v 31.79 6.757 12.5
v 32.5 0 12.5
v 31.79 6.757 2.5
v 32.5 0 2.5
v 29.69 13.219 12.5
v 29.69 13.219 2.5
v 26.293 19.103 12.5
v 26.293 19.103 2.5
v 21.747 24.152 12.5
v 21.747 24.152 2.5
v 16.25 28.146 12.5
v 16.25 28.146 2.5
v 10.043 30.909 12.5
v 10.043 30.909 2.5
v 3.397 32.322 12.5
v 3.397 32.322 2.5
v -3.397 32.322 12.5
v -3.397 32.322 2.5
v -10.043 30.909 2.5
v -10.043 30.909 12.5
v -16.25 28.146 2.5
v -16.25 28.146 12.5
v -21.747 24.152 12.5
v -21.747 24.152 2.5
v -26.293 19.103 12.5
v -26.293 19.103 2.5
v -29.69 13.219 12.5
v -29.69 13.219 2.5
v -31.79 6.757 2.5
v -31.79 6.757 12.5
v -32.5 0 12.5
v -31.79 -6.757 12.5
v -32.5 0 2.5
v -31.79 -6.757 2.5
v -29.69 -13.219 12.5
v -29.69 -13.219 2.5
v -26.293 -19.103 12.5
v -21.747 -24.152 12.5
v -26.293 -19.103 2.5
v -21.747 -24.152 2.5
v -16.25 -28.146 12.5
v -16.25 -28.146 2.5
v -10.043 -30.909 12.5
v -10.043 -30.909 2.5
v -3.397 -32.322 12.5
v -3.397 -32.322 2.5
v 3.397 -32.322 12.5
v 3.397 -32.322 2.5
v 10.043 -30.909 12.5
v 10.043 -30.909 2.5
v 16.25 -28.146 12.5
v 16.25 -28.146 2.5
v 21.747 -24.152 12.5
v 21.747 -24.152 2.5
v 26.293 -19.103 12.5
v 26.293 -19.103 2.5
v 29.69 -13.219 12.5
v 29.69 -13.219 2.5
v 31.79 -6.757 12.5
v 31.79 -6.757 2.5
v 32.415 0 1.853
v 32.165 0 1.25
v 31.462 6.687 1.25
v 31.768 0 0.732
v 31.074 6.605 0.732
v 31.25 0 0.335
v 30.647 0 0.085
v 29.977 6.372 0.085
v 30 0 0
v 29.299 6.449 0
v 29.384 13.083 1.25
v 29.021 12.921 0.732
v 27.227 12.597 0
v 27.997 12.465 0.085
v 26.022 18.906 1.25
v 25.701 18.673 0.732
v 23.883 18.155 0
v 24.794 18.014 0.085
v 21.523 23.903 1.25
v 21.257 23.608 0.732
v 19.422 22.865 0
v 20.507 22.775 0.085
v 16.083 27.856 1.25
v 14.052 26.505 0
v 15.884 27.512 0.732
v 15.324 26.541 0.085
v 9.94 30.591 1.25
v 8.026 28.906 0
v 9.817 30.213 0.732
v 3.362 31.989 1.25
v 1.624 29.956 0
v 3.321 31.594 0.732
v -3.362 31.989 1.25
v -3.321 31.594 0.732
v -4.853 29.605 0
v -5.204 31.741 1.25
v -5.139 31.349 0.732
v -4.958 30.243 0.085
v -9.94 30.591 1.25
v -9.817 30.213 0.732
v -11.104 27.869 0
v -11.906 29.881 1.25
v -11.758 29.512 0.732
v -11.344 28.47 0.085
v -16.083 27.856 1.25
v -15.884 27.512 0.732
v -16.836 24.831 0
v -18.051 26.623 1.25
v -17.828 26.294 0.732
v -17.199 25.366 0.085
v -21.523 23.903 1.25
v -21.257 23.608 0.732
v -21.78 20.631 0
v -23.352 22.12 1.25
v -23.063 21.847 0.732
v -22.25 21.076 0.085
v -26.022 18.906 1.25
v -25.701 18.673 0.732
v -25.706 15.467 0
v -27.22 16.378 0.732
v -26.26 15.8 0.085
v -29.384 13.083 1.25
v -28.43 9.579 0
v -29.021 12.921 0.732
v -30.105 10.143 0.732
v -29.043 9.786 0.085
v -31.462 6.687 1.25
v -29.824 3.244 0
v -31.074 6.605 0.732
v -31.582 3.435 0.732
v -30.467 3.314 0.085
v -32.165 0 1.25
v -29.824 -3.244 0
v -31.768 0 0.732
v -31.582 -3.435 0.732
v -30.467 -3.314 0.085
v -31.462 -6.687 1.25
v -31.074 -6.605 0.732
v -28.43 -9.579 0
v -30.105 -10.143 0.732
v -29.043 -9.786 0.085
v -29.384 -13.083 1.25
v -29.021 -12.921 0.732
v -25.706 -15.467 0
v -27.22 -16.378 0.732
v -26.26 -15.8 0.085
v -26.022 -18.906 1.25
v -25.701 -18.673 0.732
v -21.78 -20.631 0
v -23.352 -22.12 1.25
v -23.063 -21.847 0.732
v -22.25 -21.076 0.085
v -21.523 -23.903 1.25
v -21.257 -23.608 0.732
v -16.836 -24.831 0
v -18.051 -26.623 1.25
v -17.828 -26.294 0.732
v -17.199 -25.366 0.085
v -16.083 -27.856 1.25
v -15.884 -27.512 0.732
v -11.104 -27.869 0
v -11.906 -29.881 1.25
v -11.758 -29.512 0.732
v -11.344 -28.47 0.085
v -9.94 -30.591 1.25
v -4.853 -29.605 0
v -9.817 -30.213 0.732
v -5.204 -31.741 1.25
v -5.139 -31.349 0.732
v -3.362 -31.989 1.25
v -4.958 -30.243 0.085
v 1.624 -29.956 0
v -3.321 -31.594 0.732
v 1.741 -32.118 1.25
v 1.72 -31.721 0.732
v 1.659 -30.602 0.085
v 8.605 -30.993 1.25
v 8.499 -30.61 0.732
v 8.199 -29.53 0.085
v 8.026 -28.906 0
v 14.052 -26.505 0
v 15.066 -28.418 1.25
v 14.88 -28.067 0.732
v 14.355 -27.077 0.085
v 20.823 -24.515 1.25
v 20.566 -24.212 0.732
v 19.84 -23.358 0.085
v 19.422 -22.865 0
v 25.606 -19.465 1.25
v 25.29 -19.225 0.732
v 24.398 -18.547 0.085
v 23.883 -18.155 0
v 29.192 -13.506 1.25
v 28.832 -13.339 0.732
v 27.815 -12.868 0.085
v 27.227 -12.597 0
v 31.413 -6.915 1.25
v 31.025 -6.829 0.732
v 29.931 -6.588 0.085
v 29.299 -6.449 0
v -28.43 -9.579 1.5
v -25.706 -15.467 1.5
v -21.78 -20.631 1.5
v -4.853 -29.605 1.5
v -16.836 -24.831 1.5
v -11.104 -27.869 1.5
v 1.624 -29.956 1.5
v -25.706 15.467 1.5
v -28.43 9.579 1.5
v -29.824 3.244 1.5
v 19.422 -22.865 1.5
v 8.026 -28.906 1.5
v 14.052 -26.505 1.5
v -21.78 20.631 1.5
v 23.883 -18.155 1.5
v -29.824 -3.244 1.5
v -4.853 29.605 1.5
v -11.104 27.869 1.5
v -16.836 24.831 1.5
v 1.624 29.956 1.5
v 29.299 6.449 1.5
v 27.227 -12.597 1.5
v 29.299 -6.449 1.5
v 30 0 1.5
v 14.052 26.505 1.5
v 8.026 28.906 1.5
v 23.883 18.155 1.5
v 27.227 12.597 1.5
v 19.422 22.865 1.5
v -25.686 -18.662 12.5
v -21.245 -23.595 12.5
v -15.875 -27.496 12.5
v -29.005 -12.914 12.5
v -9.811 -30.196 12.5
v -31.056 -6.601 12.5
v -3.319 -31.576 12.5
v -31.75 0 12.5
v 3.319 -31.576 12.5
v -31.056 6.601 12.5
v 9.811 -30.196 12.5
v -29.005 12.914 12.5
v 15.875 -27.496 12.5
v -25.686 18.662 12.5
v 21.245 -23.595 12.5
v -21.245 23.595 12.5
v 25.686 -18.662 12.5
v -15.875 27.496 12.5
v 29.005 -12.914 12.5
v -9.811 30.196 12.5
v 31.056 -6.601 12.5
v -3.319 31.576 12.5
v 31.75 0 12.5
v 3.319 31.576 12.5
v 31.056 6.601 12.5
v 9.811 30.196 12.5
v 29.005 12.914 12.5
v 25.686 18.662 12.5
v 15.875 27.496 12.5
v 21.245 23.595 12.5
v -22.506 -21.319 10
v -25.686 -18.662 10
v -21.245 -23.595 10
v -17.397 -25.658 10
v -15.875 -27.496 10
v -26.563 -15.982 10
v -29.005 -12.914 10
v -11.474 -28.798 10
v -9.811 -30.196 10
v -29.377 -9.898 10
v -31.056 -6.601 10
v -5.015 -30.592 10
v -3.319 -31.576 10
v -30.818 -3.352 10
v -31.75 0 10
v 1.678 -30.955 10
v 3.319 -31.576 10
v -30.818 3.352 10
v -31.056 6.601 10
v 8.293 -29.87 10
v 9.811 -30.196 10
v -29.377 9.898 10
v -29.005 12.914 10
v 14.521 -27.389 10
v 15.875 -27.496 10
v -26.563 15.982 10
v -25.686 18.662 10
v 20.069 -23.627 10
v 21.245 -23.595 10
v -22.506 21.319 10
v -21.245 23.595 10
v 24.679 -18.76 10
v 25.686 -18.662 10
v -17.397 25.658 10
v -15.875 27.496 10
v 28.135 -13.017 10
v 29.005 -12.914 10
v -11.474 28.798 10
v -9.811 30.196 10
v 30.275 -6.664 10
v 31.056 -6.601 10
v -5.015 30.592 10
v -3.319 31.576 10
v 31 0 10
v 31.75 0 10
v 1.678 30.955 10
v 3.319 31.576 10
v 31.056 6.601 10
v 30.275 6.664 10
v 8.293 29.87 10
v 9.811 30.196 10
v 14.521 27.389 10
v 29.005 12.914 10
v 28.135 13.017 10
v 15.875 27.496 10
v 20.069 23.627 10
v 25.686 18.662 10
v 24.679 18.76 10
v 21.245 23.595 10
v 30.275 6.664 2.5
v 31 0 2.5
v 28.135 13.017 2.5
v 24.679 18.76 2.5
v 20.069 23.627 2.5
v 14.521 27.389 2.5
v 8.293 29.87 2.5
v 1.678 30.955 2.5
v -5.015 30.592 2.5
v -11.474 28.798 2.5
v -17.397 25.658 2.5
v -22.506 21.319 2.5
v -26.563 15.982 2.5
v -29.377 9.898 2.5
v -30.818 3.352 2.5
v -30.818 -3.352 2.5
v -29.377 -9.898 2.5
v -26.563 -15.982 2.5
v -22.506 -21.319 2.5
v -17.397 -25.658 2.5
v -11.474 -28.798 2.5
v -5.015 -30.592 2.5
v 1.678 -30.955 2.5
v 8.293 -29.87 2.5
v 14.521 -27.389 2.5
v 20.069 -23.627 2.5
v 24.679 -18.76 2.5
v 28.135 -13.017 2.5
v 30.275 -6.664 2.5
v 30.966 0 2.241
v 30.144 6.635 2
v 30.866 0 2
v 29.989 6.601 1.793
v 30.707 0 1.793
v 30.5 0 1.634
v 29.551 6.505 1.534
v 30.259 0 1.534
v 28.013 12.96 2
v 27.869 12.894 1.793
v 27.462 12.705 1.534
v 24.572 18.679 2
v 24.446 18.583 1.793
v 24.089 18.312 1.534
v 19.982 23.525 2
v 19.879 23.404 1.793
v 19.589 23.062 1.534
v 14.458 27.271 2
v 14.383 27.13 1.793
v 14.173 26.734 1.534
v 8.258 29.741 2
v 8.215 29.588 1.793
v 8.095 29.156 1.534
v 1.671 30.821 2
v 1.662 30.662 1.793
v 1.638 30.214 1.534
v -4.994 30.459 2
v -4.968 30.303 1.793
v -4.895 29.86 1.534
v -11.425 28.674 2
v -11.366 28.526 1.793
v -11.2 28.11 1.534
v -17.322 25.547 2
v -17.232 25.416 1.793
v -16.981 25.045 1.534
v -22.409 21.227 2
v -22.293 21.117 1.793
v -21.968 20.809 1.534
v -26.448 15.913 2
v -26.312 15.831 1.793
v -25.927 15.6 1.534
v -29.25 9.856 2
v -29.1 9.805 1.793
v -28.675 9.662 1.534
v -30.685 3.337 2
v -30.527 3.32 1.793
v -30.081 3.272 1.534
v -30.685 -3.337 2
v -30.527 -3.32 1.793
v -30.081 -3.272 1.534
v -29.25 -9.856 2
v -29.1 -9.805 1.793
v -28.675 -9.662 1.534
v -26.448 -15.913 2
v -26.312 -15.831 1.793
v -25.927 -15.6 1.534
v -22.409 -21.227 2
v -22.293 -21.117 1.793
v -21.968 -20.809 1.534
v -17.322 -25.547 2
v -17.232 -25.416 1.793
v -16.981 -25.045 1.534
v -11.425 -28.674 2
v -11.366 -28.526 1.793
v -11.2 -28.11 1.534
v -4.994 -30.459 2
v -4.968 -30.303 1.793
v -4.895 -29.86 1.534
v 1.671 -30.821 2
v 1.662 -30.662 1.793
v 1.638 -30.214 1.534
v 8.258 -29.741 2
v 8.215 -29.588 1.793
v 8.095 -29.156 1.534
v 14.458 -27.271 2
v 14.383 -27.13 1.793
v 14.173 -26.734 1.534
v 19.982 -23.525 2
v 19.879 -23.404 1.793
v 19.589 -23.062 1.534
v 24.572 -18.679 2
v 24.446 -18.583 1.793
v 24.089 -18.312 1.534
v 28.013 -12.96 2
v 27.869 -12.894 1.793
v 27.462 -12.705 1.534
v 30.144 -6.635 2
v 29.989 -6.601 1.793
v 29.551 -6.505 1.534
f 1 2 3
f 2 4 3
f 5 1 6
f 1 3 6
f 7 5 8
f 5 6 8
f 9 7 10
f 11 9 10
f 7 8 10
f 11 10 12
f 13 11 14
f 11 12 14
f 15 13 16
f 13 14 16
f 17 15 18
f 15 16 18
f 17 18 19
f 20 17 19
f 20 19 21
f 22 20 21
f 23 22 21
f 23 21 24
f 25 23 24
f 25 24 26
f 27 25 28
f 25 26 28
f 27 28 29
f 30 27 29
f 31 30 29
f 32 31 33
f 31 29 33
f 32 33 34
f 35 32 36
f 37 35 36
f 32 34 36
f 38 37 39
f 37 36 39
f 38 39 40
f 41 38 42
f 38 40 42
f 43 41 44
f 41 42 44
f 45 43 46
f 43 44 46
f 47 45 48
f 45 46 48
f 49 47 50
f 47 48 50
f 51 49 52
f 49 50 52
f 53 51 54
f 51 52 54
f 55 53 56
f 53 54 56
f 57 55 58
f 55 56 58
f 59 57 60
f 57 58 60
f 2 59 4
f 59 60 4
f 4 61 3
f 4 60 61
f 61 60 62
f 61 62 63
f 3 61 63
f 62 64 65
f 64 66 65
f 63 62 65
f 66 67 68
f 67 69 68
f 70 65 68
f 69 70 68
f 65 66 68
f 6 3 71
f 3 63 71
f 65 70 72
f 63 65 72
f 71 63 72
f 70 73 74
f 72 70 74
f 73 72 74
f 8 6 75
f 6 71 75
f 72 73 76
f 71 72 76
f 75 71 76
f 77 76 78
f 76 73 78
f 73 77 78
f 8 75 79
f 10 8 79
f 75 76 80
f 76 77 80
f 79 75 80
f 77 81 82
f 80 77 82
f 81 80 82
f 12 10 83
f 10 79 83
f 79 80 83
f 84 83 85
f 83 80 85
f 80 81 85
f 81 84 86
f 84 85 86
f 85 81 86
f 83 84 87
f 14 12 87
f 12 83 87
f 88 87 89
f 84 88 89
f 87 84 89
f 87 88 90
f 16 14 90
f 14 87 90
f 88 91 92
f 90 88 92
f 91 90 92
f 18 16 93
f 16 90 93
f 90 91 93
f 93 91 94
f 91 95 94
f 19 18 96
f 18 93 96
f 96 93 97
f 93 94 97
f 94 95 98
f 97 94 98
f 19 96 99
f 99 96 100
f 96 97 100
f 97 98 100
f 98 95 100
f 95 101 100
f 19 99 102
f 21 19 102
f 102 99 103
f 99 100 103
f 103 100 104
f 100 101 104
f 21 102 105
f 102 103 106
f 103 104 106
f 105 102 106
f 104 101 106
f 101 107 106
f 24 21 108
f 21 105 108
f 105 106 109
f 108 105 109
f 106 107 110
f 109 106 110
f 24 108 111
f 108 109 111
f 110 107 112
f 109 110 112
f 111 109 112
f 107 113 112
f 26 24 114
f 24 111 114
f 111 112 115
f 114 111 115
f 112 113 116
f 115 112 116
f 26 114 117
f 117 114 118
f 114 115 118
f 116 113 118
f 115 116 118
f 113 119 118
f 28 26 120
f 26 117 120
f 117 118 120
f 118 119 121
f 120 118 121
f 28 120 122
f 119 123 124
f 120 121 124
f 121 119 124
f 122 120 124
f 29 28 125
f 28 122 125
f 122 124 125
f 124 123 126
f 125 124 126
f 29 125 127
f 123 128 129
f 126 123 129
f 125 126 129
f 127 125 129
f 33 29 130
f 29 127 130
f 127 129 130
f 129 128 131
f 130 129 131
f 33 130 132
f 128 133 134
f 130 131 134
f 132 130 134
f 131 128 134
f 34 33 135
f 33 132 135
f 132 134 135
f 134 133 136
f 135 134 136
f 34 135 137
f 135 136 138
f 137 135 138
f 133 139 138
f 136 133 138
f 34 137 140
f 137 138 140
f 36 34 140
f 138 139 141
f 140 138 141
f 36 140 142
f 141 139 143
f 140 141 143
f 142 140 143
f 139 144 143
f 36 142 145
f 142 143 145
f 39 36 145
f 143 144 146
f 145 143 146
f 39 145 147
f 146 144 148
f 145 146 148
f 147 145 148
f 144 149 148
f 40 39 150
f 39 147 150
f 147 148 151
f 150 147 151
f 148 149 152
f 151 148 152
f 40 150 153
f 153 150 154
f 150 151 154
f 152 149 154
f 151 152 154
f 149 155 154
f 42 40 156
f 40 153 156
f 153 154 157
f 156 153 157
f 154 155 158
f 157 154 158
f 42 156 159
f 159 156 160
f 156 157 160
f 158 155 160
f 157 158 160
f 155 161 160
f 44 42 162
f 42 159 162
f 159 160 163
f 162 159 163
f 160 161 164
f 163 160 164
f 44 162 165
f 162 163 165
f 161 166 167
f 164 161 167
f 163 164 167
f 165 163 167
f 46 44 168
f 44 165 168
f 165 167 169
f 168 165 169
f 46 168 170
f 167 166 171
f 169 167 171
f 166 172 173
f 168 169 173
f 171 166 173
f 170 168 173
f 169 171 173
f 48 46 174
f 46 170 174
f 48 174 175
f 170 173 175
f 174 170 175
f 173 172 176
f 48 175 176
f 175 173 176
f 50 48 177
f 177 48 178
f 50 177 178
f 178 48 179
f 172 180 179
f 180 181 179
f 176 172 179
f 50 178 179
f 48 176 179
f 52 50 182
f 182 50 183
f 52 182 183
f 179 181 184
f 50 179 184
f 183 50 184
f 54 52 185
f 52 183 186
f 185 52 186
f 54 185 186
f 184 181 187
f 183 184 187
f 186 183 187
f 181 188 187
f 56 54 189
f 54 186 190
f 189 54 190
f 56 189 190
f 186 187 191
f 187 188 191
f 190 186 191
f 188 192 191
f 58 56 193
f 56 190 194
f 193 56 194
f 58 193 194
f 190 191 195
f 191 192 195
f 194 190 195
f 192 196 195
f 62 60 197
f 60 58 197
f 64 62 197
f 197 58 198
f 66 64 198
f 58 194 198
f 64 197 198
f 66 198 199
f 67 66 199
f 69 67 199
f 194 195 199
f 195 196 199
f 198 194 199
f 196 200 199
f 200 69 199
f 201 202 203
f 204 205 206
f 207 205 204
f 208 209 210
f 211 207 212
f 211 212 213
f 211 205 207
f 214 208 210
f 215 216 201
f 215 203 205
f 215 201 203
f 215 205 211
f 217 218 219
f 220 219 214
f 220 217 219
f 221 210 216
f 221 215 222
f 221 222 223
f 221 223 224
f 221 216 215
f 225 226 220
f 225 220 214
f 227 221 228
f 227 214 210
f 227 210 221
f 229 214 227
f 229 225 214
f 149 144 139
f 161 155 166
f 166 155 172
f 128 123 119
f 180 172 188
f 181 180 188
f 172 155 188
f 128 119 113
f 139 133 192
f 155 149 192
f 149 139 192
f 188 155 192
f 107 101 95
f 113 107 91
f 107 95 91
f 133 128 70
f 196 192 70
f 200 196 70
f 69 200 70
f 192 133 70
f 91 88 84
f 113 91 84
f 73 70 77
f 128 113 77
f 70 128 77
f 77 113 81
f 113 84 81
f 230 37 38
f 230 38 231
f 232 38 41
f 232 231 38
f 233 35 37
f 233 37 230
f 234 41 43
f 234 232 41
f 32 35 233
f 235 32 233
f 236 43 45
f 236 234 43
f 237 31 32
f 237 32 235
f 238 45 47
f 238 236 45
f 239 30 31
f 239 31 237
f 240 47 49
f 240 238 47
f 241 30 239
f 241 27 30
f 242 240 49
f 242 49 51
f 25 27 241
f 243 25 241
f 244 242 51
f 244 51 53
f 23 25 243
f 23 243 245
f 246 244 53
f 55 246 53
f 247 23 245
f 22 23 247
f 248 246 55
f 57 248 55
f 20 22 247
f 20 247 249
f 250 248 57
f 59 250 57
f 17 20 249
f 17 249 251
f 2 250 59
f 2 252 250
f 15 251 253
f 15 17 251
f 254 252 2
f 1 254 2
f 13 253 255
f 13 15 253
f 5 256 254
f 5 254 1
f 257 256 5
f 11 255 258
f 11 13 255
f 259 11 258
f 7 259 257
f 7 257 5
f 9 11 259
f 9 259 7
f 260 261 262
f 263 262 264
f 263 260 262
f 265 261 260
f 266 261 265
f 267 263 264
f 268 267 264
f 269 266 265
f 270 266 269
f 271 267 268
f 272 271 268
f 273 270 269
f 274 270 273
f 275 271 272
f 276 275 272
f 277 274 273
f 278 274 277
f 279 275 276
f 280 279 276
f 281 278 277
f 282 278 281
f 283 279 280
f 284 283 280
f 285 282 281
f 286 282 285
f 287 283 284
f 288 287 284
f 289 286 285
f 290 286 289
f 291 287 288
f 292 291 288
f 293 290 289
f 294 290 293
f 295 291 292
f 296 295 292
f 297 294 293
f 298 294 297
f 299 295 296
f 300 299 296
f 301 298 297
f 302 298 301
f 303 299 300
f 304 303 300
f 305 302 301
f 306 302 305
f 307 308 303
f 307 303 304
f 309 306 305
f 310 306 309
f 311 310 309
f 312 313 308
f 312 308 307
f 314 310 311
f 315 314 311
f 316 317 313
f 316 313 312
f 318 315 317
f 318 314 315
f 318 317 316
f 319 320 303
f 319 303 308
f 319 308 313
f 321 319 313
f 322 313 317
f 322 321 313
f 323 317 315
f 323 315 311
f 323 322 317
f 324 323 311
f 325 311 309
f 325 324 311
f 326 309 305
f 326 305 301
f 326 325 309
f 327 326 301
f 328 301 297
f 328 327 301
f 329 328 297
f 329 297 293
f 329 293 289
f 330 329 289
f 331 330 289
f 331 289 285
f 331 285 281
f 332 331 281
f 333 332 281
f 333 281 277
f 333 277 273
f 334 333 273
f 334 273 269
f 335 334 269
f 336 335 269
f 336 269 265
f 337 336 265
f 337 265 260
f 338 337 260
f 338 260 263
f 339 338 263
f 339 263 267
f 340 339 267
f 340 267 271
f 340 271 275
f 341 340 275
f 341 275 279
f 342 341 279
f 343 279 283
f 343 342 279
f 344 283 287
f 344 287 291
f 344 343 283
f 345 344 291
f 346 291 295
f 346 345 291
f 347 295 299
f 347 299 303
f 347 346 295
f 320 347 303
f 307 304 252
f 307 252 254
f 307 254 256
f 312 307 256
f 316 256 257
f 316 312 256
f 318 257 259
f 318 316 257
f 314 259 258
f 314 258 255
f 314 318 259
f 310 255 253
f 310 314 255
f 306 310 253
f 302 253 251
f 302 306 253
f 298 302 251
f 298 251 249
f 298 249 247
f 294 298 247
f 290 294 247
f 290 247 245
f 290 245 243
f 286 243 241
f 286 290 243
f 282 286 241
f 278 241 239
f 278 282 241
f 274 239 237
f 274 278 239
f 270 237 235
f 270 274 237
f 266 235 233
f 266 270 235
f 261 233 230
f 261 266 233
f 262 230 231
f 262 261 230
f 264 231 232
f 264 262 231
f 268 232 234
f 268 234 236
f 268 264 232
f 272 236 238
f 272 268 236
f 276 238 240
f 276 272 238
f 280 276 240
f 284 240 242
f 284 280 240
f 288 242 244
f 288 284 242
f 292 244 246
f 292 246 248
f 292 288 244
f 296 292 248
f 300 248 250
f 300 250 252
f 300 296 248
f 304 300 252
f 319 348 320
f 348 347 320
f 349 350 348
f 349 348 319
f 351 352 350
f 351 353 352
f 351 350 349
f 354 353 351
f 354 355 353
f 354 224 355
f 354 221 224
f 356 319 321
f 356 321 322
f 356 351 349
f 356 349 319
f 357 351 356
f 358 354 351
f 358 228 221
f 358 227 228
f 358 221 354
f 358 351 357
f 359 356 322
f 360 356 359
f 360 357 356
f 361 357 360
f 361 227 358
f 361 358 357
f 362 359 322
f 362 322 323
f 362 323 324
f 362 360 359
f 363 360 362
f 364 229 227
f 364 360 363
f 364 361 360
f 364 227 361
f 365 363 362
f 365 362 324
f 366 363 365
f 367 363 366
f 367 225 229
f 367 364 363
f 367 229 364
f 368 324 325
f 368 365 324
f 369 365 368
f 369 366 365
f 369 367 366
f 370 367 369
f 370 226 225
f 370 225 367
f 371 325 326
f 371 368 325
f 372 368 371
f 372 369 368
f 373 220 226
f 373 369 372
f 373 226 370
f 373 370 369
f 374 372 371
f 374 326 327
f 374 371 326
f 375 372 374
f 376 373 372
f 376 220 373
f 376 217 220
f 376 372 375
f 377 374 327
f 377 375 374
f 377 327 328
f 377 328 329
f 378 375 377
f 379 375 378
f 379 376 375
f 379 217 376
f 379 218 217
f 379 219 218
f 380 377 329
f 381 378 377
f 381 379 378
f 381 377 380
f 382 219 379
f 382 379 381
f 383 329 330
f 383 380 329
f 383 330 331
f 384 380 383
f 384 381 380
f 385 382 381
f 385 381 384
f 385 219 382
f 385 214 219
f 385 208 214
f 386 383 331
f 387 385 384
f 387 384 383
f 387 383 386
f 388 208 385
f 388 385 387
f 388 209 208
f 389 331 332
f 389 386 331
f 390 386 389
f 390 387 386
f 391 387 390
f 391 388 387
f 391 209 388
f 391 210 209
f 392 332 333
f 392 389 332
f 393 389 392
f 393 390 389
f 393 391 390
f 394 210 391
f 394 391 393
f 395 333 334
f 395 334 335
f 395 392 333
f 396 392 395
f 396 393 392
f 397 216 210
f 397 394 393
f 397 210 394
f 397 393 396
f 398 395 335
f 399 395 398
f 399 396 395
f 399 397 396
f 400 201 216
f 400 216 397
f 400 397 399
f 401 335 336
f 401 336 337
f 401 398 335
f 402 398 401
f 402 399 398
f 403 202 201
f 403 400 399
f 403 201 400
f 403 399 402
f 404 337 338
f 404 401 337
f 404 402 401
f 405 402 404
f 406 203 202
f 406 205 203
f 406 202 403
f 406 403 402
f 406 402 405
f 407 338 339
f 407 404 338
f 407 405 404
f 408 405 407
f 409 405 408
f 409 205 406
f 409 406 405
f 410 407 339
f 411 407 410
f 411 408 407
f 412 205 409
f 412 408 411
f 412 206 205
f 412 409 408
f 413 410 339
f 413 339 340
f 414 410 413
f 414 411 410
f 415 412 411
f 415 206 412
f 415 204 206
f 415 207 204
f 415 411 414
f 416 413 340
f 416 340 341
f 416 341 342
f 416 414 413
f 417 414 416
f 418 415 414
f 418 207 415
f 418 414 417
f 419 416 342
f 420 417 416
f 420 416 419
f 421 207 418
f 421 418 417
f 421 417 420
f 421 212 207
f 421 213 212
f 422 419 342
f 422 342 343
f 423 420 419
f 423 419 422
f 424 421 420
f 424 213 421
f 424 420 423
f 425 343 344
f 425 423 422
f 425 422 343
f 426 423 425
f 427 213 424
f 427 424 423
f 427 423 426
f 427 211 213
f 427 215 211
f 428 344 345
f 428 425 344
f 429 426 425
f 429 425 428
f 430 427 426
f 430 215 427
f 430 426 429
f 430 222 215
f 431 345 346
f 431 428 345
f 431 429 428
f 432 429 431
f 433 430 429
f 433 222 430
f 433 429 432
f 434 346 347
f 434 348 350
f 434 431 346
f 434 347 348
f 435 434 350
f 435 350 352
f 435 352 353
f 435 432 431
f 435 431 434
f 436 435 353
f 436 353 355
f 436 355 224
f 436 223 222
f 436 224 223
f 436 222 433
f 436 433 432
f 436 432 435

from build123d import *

# Parameters (mm, degrees)
F0_R     = 32.5
F1_DEPTH = 10
F2_R     = 2.5
F3_T     = -1.5
F4_R     = 32.5
F4_R_2   = 31.75
F5_DEPTH = 2.5


# Not quite as in the source:
# - a feature names something its author has since deleted; it is built from what else it names


with BuildPart() as f1:
    # F0 (on Top) → F1 (new body)
    with BuildSketch(Plane.XY):
        Circle(F0_R)
    extrude(amount=F1_DEPTH)

    # F2
    f2_edges = [f1.edges().sort_by_distance(p)[0] for p in [
        (-32.5, 0, 0),
    ]]
    fillet(f2_edges, radius=F2_R)

    # F3
    f3_openings = [f1.faces().sort_by_distance(p)[0] for p in [
        (0, 0, 10),
    ]]
    offset(amount=F3_T, openings=f3_openings)

    # F4 (on face) → F5 (join)
    with BuildSketch(Plane.XY.offset(10)):
        Circle(F4_R)
        Circle(F4_R_2, mode=Mode.SUBTRACT)
    extrude(amount=F5_DEPTH)


solid = f1.part
